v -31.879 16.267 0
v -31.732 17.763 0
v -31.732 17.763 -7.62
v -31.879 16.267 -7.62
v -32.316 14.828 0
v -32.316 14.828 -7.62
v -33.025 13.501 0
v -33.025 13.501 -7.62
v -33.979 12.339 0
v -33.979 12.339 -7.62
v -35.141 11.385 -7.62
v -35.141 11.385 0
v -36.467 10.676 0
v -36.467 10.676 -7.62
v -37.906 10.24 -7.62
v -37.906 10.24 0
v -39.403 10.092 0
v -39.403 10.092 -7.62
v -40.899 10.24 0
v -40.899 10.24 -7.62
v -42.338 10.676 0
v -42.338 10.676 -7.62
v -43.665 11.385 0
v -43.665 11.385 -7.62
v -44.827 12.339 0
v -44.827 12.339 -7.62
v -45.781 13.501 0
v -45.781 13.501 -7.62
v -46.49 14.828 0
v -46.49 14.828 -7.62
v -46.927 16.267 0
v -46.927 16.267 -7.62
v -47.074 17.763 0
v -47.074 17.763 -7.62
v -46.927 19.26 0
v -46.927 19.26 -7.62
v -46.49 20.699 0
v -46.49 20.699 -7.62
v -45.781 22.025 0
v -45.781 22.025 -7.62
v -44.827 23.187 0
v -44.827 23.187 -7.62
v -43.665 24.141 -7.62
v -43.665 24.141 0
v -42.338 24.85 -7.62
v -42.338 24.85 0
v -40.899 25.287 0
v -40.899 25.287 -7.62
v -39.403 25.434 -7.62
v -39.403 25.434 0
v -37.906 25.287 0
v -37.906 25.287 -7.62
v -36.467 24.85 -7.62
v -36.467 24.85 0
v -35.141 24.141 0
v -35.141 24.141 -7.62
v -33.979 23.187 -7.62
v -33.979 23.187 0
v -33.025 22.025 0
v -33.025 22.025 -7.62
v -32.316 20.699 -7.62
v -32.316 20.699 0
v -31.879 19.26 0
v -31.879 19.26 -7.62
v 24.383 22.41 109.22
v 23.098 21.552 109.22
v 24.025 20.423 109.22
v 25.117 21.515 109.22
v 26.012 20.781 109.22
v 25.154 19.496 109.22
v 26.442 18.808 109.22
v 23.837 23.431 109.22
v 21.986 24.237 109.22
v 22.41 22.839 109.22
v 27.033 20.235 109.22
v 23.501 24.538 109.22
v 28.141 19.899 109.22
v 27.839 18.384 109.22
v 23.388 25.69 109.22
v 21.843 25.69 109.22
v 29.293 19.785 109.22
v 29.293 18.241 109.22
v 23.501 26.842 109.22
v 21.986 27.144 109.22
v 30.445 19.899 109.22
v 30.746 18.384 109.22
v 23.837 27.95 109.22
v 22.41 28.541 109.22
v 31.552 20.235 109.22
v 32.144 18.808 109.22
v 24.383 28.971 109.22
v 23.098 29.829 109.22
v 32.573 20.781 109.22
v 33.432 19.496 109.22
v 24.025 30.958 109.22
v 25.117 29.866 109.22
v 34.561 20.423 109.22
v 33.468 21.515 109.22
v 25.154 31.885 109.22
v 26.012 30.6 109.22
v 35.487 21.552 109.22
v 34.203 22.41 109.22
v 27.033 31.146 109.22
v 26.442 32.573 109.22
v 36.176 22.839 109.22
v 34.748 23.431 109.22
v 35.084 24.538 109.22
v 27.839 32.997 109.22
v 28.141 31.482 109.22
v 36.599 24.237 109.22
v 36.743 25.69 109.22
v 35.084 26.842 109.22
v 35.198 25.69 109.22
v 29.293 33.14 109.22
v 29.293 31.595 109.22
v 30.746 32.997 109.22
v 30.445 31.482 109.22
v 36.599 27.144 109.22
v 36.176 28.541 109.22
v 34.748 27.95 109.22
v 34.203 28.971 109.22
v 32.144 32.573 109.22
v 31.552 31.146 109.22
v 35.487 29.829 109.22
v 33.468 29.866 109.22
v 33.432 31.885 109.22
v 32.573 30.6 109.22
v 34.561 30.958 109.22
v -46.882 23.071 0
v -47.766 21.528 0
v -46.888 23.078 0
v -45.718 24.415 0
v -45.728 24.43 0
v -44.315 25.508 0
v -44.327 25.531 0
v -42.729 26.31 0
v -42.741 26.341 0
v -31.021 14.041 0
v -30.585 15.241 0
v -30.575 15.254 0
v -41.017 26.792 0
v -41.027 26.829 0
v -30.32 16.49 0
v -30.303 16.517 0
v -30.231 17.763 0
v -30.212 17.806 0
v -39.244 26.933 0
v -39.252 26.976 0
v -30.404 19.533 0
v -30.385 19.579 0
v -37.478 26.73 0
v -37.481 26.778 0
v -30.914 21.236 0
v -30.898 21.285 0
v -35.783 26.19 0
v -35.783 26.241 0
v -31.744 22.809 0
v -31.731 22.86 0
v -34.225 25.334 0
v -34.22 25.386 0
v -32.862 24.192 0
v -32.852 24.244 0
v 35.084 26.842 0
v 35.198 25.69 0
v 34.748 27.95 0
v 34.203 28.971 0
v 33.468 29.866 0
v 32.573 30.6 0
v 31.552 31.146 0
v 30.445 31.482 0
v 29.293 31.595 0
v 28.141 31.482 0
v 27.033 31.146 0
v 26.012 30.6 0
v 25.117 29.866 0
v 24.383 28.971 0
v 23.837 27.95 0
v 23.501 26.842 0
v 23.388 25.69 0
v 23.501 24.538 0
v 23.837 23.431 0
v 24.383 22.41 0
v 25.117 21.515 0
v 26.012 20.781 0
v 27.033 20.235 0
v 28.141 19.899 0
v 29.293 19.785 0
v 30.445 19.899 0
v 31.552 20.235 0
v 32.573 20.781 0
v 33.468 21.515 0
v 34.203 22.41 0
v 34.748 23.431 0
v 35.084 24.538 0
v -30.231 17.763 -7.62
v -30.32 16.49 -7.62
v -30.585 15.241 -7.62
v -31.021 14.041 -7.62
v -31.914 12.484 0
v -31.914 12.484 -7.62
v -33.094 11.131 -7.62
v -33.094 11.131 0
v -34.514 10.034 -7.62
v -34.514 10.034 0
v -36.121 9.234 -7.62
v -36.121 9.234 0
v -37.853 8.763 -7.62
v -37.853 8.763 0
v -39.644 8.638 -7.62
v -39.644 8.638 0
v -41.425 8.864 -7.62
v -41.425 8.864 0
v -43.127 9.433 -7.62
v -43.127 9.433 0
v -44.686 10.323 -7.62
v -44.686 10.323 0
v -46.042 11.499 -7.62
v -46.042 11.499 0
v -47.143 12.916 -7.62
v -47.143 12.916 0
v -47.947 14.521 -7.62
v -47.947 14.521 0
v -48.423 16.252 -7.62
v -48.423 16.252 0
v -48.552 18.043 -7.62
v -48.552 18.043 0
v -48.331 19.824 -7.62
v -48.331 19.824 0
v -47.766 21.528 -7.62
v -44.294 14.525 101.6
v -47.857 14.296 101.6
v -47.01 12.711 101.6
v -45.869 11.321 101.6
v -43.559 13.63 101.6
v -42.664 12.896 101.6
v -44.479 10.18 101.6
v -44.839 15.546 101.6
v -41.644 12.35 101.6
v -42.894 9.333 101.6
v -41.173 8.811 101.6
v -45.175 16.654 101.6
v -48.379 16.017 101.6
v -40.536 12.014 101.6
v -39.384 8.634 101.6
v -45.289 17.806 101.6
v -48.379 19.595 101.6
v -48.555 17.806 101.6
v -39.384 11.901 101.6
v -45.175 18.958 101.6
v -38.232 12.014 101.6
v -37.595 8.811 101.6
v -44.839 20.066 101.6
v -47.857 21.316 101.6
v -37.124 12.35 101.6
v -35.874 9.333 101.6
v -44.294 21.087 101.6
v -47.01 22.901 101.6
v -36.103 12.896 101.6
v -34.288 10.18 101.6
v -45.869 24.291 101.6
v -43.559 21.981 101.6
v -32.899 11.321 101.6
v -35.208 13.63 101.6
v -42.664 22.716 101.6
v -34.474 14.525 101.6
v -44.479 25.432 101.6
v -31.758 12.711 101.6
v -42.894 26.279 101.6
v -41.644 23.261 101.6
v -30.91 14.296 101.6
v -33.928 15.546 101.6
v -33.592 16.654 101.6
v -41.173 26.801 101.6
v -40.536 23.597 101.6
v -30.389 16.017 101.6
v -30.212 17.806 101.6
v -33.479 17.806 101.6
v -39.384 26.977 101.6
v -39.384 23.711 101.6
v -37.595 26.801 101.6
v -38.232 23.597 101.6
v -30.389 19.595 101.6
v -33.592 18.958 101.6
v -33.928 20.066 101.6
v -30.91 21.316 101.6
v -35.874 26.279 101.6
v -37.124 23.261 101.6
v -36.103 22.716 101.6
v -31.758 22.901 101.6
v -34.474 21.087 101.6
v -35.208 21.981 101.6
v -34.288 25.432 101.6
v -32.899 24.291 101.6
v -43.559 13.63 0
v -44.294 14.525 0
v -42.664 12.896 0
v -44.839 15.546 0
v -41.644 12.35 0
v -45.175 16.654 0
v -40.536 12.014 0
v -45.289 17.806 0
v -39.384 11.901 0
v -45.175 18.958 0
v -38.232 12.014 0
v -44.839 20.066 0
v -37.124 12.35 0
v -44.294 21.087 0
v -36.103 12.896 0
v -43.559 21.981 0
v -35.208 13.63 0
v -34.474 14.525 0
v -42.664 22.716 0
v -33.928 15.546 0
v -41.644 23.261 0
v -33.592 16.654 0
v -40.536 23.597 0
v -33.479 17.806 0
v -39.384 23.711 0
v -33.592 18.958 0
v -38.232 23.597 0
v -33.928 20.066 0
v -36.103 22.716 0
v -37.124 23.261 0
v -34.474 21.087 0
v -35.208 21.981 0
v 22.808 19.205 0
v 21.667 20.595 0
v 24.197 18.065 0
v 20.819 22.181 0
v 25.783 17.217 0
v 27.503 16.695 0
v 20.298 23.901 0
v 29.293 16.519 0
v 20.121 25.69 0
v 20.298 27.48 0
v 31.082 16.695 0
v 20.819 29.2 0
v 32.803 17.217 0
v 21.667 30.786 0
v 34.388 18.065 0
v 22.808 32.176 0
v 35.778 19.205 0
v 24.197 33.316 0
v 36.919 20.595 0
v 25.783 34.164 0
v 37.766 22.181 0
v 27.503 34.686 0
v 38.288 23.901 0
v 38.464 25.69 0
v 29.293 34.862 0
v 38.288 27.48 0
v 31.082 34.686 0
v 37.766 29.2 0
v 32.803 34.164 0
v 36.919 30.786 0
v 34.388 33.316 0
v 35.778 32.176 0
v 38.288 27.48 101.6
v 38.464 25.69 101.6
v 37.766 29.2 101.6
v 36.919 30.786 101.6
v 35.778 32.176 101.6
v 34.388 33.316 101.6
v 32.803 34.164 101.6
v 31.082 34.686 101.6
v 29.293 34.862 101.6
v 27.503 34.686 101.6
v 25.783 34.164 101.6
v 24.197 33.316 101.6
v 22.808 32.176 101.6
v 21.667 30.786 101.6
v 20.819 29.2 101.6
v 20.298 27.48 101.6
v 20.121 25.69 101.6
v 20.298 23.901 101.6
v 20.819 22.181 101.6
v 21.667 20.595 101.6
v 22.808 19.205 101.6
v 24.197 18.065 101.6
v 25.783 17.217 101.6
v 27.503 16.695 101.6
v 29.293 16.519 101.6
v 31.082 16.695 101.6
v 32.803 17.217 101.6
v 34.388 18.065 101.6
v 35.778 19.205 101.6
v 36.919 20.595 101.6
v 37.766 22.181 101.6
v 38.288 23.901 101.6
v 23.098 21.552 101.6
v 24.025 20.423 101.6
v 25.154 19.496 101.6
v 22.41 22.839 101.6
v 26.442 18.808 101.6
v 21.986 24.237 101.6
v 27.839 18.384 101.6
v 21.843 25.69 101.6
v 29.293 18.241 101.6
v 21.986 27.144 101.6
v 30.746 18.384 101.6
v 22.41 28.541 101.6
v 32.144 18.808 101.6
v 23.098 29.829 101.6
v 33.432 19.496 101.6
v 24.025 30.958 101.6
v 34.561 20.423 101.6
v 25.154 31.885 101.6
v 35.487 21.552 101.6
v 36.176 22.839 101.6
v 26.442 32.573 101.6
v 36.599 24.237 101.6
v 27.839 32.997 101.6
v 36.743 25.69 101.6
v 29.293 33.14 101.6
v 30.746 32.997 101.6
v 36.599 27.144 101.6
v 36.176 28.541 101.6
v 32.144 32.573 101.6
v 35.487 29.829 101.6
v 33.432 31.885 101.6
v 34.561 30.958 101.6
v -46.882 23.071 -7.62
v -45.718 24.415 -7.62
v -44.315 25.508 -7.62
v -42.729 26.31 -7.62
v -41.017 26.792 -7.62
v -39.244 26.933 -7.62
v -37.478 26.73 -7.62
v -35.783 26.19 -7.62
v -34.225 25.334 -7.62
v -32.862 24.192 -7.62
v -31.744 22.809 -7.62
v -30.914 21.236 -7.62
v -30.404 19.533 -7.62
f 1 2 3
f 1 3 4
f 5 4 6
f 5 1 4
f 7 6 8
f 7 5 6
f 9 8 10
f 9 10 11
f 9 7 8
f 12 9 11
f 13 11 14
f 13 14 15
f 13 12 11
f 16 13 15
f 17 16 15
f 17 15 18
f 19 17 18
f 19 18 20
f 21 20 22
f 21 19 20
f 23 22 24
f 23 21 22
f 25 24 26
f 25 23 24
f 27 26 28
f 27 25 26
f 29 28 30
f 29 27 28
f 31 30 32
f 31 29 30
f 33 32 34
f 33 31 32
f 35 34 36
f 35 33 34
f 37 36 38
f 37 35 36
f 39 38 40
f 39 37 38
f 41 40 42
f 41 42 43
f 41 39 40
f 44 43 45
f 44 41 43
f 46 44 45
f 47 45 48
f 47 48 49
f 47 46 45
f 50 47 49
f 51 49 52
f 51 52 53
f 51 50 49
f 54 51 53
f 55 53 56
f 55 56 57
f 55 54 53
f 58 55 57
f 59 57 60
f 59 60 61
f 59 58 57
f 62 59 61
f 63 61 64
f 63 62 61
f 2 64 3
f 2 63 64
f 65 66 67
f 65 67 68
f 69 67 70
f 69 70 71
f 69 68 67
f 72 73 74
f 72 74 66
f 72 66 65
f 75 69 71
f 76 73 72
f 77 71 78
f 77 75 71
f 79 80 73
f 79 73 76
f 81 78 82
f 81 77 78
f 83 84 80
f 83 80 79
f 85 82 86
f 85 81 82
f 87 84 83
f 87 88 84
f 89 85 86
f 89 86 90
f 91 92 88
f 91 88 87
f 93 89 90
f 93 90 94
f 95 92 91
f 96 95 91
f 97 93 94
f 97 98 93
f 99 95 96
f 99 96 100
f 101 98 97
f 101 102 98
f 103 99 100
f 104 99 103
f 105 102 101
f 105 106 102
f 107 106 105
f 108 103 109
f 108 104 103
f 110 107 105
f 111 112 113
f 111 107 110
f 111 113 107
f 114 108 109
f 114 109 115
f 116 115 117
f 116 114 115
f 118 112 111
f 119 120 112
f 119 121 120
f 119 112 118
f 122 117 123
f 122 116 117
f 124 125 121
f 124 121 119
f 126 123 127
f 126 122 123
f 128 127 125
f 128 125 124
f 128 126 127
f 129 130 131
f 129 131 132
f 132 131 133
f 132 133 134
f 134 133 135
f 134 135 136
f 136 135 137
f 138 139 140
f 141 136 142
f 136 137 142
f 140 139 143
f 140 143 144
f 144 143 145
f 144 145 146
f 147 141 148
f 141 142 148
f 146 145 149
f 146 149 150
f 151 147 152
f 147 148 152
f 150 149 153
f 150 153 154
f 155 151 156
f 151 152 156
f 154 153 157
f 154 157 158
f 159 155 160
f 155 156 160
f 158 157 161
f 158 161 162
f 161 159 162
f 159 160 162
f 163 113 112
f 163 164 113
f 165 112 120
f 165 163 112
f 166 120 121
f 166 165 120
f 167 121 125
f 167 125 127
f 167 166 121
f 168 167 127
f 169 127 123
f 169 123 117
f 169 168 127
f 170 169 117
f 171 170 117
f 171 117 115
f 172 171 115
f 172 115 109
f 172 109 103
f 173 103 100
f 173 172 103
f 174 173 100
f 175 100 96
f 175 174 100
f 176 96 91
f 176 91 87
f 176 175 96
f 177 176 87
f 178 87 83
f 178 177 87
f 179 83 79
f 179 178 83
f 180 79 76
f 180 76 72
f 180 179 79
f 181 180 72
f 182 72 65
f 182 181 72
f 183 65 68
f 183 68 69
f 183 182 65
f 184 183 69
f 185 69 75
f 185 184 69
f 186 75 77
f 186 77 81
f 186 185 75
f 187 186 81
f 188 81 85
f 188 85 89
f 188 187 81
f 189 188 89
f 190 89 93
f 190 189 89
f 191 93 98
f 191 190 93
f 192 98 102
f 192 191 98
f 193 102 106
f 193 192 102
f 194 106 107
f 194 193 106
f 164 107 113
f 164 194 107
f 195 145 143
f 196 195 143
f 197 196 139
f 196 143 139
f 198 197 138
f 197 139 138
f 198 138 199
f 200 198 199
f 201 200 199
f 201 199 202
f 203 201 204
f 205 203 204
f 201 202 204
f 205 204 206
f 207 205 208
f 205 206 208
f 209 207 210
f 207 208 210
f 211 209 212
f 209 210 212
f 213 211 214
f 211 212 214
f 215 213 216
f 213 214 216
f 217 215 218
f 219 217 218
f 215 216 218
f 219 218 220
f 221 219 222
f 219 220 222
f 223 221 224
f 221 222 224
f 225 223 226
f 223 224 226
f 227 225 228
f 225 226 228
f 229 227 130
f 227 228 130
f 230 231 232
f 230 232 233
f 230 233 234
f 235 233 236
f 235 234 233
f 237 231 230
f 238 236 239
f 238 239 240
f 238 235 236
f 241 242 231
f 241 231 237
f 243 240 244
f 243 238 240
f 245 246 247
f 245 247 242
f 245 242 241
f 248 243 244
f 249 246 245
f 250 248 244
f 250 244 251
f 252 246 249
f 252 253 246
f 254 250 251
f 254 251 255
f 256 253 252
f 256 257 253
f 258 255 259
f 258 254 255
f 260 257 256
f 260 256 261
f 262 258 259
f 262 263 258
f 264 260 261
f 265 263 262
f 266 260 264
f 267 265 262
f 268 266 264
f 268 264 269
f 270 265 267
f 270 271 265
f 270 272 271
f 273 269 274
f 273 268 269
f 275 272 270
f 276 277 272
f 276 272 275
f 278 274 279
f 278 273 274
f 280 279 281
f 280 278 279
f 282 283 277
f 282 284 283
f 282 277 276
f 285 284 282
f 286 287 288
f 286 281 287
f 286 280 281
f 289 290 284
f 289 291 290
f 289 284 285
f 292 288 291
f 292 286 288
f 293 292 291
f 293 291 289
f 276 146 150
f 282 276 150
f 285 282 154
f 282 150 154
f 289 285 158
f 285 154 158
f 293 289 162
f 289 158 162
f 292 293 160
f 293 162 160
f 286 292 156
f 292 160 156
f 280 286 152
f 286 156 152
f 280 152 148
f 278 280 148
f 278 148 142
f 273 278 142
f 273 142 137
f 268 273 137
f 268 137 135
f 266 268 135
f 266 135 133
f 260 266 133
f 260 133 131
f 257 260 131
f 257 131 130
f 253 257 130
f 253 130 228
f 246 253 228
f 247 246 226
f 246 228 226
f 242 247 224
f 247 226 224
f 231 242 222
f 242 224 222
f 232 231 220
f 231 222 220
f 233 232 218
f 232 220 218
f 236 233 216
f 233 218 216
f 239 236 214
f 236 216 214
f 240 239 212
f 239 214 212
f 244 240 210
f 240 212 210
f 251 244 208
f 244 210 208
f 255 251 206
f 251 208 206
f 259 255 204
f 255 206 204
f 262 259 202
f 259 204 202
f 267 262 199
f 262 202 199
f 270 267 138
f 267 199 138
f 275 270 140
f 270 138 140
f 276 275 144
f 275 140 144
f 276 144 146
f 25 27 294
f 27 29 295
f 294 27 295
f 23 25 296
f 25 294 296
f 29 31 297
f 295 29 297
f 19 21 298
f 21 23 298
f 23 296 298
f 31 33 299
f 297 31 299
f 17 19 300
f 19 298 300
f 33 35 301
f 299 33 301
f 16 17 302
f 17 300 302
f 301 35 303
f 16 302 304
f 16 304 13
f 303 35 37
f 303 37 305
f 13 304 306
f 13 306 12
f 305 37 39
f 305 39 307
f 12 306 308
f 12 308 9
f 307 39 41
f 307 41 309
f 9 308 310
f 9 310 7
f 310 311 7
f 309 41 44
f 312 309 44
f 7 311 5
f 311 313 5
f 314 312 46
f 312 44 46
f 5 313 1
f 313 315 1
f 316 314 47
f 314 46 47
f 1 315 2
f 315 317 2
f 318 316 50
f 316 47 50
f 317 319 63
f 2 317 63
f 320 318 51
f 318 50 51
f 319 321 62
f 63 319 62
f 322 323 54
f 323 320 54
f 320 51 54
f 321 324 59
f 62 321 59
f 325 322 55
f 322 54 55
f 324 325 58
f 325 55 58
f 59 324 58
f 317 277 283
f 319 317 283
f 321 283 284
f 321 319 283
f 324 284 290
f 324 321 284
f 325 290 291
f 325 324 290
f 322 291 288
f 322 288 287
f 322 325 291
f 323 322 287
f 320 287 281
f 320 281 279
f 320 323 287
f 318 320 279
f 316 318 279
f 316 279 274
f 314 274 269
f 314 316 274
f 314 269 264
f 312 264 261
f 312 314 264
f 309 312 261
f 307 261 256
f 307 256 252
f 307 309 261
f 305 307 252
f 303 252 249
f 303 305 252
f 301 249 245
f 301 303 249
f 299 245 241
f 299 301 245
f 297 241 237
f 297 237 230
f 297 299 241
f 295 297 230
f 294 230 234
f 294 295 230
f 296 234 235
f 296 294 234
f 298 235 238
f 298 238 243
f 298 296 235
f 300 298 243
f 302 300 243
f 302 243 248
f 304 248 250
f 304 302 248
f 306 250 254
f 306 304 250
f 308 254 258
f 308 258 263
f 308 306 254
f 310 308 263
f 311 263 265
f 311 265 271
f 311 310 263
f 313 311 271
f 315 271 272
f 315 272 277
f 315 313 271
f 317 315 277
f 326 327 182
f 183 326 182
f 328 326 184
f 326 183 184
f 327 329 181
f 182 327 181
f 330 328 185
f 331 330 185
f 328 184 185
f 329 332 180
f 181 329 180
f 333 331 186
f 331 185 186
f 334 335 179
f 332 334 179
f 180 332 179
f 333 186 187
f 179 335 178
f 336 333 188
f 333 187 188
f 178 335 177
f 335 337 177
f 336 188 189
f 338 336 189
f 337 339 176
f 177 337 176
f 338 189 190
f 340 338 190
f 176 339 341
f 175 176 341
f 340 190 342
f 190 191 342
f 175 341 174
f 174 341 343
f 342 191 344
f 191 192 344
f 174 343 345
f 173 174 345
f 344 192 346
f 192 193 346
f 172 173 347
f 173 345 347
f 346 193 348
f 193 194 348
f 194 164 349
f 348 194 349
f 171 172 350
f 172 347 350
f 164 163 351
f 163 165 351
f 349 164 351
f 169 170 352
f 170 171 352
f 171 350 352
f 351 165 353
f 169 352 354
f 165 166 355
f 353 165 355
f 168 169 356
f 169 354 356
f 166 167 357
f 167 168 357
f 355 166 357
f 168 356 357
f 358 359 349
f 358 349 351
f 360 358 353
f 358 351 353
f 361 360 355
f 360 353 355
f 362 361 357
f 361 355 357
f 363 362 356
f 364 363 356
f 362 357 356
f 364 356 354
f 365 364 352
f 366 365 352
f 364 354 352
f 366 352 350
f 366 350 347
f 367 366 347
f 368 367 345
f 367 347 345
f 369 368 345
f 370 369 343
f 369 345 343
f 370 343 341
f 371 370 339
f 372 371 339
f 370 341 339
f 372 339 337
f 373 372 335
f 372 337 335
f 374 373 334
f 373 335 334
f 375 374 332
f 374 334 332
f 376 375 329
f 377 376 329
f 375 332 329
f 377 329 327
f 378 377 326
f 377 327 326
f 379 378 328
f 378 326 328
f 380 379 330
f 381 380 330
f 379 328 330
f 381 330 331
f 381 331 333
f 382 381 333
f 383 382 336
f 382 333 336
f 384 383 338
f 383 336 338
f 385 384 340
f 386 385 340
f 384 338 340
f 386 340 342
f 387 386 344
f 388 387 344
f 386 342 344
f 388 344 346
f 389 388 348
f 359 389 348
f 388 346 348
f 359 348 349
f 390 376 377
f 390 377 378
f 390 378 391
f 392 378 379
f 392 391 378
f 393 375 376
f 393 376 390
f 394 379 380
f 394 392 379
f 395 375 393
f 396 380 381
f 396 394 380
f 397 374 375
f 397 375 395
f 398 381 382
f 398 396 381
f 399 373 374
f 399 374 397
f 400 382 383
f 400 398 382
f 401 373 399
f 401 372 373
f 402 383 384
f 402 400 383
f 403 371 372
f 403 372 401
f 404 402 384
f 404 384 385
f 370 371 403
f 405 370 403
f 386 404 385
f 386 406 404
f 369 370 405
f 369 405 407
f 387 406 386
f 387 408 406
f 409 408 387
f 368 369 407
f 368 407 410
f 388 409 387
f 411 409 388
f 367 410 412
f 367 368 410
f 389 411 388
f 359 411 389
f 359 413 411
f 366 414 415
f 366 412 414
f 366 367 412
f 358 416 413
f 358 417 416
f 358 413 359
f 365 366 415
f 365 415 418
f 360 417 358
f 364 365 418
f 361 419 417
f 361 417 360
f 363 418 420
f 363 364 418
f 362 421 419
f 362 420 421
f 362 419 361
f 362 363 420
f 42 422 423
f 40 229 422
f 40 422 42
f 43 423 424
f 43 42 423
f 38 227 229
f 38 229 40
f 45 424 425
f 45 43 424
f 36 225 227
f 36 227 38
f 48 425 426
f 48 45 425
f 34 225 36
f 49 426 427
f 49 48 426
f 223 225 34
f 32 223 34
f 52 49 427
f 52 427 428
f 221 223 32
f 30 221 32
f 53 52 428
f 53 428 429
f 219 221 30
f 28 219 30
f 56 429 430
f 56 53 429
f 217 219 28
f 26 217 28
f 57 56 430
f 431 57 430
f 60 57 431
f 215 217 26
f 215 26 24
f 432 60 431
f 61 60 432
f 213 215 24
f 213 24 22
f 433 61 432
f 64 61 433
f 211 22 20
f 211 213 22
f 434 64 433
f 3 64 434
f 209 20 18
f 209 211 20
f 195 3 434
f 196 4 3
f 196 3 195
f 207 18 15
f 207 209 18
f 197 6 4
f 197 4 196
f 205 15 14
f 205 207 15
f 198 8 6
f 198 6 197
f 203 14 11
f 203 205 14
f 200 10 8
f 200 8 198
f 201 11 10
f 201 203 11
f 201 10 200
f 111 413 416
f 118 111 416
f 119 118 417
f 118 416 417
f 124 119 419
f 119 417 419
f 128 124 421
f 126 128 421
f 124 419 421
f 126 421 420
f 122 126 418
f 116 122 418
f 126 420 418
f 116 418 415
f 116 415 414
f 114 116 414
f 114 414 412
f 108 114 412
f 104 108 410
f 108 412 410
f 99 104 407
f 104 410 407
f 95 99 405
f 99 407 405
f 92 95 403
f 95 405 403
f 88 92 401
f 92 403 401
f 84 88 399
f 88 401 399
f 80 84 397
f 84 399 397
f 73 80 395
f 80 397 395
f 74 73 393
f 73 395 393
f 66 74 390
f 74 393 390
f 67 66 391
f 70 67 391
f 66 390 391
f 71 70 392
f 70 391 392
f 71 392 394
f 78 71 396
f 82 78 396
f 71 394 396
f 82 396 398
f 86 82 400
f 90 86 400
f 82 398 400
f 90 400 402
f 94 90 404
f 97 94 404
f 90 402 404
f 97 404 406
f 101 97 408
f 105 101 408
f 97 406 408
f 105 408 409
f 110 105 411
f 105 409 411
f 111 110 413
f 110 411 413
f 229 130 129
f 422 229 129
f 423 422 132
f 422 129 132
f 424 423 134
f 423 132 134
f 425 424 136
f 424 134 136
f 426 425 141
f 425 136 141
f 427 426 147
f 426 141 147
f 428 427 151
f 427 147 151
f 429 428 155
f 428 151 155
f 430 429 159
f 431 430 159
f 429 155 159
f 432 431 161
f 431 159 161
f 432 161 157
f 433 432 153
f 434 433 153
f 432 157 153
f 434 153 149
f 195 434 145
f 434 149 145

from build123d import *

# Parameters (mm, degrees)
F0_R     = 9.1714865533
F0_R_2   = 7.6710719474
F0_R_3   = 5.9049676463
F1_DEPTH = 101.6
F2_R     = 7.4498269309
F2_R_2   = 5.9049676463
F3_DEPTH = 7.62
F4_R     = 9.1714865533
F4_R_2   = 7.6710719474
F4_R_3   = 5.9049676463
F5_DEPTH = 101.6
F6_R     = 7.6710719474
F7_DEPTH = 7.62


with BuildPart() as f1:
    # F0 (on Top) → F1 (new body)
    with BuildSketch(Plane.XY):
        with Locations((29.2927622795, 25.6904140115)):
            Circle(F0_R)
        with Locations((29.2927622795, 25.6904140115)):
            Circle(F0_R_2, mode=Mode.SUBTRACT)
        with Locations((29.2927622795, 25.6904140115)):
            Circle(F0_R_2)
        with Locations((29.2927622795, 25.6904140115)):
            Circle(F0_R_3, mode=Mode.SUBTRACT)
    extrude(amount=F1_DEPTH)

    # F2 (on face) → F3 (join)
    with BuildSketch(Plane.XY.offset(101.6)):
        with Locations((29.2927622795, 25.6904140115)):
            Circle(F2_R)
        with Locations((29.2927622795, 25.6904140115)):
            Circle(F2_R_2, mode=Mode.SUBTRACT)
    extrude(amount=F3_DEPTH)


with BuildPart() as f5:
    # F4 (on Top) → F5 (new body)
    with BuildSketch(Plane.XY):
        with Locations((-39.3837876618, 17.8059246391)):
            Circle(F4_R)
        with Locations((-39.3837876618, 17.8059246391)):
            Circle(F4_R_2, mode=Mode.SUBTRACT)
        with Locations((-39.3837876618, 17.8059246391)):
            Circle(F4_R_2)
        with Locations((-39.3837876618, 17.8059246391)):
            Circle(F4_R_3, mode=Mode.SUBTRACT)
    extrude(amount=F5_DEPTH)

    # F6 (on face) → F7 (join)
    with BuildSketch(Plane(origin=(0, 0, 0), x_dir=(1, 0, 0), z_dir=(0, 0, -1))):
        with BuildLine():
            ThreePointArc((-47.7661005186, -21.5278860533), (-37.4776533563, -26.7303737374), (-30.2313894959, -17.763229087))
            ThreePointArc((-30.2313894959, -17.763229087), (-30.4308518838, -15.8608758146), (-31.0205631925, -14.0412676728))
            ThreePointArc((-31.0205631925, -14.0412676728), (-43.1271090193, -9.4331287612), (-47.7661005186, -21.5278860533))
        make_face()
        with Locations((-39.4028760493, -17.763229087)):
            Circle(F6_R, mode=Mode.SUBTRACT)
    extrude(amount=F7_DEPTH)


solid = Compound([f1.part, f5.part])
